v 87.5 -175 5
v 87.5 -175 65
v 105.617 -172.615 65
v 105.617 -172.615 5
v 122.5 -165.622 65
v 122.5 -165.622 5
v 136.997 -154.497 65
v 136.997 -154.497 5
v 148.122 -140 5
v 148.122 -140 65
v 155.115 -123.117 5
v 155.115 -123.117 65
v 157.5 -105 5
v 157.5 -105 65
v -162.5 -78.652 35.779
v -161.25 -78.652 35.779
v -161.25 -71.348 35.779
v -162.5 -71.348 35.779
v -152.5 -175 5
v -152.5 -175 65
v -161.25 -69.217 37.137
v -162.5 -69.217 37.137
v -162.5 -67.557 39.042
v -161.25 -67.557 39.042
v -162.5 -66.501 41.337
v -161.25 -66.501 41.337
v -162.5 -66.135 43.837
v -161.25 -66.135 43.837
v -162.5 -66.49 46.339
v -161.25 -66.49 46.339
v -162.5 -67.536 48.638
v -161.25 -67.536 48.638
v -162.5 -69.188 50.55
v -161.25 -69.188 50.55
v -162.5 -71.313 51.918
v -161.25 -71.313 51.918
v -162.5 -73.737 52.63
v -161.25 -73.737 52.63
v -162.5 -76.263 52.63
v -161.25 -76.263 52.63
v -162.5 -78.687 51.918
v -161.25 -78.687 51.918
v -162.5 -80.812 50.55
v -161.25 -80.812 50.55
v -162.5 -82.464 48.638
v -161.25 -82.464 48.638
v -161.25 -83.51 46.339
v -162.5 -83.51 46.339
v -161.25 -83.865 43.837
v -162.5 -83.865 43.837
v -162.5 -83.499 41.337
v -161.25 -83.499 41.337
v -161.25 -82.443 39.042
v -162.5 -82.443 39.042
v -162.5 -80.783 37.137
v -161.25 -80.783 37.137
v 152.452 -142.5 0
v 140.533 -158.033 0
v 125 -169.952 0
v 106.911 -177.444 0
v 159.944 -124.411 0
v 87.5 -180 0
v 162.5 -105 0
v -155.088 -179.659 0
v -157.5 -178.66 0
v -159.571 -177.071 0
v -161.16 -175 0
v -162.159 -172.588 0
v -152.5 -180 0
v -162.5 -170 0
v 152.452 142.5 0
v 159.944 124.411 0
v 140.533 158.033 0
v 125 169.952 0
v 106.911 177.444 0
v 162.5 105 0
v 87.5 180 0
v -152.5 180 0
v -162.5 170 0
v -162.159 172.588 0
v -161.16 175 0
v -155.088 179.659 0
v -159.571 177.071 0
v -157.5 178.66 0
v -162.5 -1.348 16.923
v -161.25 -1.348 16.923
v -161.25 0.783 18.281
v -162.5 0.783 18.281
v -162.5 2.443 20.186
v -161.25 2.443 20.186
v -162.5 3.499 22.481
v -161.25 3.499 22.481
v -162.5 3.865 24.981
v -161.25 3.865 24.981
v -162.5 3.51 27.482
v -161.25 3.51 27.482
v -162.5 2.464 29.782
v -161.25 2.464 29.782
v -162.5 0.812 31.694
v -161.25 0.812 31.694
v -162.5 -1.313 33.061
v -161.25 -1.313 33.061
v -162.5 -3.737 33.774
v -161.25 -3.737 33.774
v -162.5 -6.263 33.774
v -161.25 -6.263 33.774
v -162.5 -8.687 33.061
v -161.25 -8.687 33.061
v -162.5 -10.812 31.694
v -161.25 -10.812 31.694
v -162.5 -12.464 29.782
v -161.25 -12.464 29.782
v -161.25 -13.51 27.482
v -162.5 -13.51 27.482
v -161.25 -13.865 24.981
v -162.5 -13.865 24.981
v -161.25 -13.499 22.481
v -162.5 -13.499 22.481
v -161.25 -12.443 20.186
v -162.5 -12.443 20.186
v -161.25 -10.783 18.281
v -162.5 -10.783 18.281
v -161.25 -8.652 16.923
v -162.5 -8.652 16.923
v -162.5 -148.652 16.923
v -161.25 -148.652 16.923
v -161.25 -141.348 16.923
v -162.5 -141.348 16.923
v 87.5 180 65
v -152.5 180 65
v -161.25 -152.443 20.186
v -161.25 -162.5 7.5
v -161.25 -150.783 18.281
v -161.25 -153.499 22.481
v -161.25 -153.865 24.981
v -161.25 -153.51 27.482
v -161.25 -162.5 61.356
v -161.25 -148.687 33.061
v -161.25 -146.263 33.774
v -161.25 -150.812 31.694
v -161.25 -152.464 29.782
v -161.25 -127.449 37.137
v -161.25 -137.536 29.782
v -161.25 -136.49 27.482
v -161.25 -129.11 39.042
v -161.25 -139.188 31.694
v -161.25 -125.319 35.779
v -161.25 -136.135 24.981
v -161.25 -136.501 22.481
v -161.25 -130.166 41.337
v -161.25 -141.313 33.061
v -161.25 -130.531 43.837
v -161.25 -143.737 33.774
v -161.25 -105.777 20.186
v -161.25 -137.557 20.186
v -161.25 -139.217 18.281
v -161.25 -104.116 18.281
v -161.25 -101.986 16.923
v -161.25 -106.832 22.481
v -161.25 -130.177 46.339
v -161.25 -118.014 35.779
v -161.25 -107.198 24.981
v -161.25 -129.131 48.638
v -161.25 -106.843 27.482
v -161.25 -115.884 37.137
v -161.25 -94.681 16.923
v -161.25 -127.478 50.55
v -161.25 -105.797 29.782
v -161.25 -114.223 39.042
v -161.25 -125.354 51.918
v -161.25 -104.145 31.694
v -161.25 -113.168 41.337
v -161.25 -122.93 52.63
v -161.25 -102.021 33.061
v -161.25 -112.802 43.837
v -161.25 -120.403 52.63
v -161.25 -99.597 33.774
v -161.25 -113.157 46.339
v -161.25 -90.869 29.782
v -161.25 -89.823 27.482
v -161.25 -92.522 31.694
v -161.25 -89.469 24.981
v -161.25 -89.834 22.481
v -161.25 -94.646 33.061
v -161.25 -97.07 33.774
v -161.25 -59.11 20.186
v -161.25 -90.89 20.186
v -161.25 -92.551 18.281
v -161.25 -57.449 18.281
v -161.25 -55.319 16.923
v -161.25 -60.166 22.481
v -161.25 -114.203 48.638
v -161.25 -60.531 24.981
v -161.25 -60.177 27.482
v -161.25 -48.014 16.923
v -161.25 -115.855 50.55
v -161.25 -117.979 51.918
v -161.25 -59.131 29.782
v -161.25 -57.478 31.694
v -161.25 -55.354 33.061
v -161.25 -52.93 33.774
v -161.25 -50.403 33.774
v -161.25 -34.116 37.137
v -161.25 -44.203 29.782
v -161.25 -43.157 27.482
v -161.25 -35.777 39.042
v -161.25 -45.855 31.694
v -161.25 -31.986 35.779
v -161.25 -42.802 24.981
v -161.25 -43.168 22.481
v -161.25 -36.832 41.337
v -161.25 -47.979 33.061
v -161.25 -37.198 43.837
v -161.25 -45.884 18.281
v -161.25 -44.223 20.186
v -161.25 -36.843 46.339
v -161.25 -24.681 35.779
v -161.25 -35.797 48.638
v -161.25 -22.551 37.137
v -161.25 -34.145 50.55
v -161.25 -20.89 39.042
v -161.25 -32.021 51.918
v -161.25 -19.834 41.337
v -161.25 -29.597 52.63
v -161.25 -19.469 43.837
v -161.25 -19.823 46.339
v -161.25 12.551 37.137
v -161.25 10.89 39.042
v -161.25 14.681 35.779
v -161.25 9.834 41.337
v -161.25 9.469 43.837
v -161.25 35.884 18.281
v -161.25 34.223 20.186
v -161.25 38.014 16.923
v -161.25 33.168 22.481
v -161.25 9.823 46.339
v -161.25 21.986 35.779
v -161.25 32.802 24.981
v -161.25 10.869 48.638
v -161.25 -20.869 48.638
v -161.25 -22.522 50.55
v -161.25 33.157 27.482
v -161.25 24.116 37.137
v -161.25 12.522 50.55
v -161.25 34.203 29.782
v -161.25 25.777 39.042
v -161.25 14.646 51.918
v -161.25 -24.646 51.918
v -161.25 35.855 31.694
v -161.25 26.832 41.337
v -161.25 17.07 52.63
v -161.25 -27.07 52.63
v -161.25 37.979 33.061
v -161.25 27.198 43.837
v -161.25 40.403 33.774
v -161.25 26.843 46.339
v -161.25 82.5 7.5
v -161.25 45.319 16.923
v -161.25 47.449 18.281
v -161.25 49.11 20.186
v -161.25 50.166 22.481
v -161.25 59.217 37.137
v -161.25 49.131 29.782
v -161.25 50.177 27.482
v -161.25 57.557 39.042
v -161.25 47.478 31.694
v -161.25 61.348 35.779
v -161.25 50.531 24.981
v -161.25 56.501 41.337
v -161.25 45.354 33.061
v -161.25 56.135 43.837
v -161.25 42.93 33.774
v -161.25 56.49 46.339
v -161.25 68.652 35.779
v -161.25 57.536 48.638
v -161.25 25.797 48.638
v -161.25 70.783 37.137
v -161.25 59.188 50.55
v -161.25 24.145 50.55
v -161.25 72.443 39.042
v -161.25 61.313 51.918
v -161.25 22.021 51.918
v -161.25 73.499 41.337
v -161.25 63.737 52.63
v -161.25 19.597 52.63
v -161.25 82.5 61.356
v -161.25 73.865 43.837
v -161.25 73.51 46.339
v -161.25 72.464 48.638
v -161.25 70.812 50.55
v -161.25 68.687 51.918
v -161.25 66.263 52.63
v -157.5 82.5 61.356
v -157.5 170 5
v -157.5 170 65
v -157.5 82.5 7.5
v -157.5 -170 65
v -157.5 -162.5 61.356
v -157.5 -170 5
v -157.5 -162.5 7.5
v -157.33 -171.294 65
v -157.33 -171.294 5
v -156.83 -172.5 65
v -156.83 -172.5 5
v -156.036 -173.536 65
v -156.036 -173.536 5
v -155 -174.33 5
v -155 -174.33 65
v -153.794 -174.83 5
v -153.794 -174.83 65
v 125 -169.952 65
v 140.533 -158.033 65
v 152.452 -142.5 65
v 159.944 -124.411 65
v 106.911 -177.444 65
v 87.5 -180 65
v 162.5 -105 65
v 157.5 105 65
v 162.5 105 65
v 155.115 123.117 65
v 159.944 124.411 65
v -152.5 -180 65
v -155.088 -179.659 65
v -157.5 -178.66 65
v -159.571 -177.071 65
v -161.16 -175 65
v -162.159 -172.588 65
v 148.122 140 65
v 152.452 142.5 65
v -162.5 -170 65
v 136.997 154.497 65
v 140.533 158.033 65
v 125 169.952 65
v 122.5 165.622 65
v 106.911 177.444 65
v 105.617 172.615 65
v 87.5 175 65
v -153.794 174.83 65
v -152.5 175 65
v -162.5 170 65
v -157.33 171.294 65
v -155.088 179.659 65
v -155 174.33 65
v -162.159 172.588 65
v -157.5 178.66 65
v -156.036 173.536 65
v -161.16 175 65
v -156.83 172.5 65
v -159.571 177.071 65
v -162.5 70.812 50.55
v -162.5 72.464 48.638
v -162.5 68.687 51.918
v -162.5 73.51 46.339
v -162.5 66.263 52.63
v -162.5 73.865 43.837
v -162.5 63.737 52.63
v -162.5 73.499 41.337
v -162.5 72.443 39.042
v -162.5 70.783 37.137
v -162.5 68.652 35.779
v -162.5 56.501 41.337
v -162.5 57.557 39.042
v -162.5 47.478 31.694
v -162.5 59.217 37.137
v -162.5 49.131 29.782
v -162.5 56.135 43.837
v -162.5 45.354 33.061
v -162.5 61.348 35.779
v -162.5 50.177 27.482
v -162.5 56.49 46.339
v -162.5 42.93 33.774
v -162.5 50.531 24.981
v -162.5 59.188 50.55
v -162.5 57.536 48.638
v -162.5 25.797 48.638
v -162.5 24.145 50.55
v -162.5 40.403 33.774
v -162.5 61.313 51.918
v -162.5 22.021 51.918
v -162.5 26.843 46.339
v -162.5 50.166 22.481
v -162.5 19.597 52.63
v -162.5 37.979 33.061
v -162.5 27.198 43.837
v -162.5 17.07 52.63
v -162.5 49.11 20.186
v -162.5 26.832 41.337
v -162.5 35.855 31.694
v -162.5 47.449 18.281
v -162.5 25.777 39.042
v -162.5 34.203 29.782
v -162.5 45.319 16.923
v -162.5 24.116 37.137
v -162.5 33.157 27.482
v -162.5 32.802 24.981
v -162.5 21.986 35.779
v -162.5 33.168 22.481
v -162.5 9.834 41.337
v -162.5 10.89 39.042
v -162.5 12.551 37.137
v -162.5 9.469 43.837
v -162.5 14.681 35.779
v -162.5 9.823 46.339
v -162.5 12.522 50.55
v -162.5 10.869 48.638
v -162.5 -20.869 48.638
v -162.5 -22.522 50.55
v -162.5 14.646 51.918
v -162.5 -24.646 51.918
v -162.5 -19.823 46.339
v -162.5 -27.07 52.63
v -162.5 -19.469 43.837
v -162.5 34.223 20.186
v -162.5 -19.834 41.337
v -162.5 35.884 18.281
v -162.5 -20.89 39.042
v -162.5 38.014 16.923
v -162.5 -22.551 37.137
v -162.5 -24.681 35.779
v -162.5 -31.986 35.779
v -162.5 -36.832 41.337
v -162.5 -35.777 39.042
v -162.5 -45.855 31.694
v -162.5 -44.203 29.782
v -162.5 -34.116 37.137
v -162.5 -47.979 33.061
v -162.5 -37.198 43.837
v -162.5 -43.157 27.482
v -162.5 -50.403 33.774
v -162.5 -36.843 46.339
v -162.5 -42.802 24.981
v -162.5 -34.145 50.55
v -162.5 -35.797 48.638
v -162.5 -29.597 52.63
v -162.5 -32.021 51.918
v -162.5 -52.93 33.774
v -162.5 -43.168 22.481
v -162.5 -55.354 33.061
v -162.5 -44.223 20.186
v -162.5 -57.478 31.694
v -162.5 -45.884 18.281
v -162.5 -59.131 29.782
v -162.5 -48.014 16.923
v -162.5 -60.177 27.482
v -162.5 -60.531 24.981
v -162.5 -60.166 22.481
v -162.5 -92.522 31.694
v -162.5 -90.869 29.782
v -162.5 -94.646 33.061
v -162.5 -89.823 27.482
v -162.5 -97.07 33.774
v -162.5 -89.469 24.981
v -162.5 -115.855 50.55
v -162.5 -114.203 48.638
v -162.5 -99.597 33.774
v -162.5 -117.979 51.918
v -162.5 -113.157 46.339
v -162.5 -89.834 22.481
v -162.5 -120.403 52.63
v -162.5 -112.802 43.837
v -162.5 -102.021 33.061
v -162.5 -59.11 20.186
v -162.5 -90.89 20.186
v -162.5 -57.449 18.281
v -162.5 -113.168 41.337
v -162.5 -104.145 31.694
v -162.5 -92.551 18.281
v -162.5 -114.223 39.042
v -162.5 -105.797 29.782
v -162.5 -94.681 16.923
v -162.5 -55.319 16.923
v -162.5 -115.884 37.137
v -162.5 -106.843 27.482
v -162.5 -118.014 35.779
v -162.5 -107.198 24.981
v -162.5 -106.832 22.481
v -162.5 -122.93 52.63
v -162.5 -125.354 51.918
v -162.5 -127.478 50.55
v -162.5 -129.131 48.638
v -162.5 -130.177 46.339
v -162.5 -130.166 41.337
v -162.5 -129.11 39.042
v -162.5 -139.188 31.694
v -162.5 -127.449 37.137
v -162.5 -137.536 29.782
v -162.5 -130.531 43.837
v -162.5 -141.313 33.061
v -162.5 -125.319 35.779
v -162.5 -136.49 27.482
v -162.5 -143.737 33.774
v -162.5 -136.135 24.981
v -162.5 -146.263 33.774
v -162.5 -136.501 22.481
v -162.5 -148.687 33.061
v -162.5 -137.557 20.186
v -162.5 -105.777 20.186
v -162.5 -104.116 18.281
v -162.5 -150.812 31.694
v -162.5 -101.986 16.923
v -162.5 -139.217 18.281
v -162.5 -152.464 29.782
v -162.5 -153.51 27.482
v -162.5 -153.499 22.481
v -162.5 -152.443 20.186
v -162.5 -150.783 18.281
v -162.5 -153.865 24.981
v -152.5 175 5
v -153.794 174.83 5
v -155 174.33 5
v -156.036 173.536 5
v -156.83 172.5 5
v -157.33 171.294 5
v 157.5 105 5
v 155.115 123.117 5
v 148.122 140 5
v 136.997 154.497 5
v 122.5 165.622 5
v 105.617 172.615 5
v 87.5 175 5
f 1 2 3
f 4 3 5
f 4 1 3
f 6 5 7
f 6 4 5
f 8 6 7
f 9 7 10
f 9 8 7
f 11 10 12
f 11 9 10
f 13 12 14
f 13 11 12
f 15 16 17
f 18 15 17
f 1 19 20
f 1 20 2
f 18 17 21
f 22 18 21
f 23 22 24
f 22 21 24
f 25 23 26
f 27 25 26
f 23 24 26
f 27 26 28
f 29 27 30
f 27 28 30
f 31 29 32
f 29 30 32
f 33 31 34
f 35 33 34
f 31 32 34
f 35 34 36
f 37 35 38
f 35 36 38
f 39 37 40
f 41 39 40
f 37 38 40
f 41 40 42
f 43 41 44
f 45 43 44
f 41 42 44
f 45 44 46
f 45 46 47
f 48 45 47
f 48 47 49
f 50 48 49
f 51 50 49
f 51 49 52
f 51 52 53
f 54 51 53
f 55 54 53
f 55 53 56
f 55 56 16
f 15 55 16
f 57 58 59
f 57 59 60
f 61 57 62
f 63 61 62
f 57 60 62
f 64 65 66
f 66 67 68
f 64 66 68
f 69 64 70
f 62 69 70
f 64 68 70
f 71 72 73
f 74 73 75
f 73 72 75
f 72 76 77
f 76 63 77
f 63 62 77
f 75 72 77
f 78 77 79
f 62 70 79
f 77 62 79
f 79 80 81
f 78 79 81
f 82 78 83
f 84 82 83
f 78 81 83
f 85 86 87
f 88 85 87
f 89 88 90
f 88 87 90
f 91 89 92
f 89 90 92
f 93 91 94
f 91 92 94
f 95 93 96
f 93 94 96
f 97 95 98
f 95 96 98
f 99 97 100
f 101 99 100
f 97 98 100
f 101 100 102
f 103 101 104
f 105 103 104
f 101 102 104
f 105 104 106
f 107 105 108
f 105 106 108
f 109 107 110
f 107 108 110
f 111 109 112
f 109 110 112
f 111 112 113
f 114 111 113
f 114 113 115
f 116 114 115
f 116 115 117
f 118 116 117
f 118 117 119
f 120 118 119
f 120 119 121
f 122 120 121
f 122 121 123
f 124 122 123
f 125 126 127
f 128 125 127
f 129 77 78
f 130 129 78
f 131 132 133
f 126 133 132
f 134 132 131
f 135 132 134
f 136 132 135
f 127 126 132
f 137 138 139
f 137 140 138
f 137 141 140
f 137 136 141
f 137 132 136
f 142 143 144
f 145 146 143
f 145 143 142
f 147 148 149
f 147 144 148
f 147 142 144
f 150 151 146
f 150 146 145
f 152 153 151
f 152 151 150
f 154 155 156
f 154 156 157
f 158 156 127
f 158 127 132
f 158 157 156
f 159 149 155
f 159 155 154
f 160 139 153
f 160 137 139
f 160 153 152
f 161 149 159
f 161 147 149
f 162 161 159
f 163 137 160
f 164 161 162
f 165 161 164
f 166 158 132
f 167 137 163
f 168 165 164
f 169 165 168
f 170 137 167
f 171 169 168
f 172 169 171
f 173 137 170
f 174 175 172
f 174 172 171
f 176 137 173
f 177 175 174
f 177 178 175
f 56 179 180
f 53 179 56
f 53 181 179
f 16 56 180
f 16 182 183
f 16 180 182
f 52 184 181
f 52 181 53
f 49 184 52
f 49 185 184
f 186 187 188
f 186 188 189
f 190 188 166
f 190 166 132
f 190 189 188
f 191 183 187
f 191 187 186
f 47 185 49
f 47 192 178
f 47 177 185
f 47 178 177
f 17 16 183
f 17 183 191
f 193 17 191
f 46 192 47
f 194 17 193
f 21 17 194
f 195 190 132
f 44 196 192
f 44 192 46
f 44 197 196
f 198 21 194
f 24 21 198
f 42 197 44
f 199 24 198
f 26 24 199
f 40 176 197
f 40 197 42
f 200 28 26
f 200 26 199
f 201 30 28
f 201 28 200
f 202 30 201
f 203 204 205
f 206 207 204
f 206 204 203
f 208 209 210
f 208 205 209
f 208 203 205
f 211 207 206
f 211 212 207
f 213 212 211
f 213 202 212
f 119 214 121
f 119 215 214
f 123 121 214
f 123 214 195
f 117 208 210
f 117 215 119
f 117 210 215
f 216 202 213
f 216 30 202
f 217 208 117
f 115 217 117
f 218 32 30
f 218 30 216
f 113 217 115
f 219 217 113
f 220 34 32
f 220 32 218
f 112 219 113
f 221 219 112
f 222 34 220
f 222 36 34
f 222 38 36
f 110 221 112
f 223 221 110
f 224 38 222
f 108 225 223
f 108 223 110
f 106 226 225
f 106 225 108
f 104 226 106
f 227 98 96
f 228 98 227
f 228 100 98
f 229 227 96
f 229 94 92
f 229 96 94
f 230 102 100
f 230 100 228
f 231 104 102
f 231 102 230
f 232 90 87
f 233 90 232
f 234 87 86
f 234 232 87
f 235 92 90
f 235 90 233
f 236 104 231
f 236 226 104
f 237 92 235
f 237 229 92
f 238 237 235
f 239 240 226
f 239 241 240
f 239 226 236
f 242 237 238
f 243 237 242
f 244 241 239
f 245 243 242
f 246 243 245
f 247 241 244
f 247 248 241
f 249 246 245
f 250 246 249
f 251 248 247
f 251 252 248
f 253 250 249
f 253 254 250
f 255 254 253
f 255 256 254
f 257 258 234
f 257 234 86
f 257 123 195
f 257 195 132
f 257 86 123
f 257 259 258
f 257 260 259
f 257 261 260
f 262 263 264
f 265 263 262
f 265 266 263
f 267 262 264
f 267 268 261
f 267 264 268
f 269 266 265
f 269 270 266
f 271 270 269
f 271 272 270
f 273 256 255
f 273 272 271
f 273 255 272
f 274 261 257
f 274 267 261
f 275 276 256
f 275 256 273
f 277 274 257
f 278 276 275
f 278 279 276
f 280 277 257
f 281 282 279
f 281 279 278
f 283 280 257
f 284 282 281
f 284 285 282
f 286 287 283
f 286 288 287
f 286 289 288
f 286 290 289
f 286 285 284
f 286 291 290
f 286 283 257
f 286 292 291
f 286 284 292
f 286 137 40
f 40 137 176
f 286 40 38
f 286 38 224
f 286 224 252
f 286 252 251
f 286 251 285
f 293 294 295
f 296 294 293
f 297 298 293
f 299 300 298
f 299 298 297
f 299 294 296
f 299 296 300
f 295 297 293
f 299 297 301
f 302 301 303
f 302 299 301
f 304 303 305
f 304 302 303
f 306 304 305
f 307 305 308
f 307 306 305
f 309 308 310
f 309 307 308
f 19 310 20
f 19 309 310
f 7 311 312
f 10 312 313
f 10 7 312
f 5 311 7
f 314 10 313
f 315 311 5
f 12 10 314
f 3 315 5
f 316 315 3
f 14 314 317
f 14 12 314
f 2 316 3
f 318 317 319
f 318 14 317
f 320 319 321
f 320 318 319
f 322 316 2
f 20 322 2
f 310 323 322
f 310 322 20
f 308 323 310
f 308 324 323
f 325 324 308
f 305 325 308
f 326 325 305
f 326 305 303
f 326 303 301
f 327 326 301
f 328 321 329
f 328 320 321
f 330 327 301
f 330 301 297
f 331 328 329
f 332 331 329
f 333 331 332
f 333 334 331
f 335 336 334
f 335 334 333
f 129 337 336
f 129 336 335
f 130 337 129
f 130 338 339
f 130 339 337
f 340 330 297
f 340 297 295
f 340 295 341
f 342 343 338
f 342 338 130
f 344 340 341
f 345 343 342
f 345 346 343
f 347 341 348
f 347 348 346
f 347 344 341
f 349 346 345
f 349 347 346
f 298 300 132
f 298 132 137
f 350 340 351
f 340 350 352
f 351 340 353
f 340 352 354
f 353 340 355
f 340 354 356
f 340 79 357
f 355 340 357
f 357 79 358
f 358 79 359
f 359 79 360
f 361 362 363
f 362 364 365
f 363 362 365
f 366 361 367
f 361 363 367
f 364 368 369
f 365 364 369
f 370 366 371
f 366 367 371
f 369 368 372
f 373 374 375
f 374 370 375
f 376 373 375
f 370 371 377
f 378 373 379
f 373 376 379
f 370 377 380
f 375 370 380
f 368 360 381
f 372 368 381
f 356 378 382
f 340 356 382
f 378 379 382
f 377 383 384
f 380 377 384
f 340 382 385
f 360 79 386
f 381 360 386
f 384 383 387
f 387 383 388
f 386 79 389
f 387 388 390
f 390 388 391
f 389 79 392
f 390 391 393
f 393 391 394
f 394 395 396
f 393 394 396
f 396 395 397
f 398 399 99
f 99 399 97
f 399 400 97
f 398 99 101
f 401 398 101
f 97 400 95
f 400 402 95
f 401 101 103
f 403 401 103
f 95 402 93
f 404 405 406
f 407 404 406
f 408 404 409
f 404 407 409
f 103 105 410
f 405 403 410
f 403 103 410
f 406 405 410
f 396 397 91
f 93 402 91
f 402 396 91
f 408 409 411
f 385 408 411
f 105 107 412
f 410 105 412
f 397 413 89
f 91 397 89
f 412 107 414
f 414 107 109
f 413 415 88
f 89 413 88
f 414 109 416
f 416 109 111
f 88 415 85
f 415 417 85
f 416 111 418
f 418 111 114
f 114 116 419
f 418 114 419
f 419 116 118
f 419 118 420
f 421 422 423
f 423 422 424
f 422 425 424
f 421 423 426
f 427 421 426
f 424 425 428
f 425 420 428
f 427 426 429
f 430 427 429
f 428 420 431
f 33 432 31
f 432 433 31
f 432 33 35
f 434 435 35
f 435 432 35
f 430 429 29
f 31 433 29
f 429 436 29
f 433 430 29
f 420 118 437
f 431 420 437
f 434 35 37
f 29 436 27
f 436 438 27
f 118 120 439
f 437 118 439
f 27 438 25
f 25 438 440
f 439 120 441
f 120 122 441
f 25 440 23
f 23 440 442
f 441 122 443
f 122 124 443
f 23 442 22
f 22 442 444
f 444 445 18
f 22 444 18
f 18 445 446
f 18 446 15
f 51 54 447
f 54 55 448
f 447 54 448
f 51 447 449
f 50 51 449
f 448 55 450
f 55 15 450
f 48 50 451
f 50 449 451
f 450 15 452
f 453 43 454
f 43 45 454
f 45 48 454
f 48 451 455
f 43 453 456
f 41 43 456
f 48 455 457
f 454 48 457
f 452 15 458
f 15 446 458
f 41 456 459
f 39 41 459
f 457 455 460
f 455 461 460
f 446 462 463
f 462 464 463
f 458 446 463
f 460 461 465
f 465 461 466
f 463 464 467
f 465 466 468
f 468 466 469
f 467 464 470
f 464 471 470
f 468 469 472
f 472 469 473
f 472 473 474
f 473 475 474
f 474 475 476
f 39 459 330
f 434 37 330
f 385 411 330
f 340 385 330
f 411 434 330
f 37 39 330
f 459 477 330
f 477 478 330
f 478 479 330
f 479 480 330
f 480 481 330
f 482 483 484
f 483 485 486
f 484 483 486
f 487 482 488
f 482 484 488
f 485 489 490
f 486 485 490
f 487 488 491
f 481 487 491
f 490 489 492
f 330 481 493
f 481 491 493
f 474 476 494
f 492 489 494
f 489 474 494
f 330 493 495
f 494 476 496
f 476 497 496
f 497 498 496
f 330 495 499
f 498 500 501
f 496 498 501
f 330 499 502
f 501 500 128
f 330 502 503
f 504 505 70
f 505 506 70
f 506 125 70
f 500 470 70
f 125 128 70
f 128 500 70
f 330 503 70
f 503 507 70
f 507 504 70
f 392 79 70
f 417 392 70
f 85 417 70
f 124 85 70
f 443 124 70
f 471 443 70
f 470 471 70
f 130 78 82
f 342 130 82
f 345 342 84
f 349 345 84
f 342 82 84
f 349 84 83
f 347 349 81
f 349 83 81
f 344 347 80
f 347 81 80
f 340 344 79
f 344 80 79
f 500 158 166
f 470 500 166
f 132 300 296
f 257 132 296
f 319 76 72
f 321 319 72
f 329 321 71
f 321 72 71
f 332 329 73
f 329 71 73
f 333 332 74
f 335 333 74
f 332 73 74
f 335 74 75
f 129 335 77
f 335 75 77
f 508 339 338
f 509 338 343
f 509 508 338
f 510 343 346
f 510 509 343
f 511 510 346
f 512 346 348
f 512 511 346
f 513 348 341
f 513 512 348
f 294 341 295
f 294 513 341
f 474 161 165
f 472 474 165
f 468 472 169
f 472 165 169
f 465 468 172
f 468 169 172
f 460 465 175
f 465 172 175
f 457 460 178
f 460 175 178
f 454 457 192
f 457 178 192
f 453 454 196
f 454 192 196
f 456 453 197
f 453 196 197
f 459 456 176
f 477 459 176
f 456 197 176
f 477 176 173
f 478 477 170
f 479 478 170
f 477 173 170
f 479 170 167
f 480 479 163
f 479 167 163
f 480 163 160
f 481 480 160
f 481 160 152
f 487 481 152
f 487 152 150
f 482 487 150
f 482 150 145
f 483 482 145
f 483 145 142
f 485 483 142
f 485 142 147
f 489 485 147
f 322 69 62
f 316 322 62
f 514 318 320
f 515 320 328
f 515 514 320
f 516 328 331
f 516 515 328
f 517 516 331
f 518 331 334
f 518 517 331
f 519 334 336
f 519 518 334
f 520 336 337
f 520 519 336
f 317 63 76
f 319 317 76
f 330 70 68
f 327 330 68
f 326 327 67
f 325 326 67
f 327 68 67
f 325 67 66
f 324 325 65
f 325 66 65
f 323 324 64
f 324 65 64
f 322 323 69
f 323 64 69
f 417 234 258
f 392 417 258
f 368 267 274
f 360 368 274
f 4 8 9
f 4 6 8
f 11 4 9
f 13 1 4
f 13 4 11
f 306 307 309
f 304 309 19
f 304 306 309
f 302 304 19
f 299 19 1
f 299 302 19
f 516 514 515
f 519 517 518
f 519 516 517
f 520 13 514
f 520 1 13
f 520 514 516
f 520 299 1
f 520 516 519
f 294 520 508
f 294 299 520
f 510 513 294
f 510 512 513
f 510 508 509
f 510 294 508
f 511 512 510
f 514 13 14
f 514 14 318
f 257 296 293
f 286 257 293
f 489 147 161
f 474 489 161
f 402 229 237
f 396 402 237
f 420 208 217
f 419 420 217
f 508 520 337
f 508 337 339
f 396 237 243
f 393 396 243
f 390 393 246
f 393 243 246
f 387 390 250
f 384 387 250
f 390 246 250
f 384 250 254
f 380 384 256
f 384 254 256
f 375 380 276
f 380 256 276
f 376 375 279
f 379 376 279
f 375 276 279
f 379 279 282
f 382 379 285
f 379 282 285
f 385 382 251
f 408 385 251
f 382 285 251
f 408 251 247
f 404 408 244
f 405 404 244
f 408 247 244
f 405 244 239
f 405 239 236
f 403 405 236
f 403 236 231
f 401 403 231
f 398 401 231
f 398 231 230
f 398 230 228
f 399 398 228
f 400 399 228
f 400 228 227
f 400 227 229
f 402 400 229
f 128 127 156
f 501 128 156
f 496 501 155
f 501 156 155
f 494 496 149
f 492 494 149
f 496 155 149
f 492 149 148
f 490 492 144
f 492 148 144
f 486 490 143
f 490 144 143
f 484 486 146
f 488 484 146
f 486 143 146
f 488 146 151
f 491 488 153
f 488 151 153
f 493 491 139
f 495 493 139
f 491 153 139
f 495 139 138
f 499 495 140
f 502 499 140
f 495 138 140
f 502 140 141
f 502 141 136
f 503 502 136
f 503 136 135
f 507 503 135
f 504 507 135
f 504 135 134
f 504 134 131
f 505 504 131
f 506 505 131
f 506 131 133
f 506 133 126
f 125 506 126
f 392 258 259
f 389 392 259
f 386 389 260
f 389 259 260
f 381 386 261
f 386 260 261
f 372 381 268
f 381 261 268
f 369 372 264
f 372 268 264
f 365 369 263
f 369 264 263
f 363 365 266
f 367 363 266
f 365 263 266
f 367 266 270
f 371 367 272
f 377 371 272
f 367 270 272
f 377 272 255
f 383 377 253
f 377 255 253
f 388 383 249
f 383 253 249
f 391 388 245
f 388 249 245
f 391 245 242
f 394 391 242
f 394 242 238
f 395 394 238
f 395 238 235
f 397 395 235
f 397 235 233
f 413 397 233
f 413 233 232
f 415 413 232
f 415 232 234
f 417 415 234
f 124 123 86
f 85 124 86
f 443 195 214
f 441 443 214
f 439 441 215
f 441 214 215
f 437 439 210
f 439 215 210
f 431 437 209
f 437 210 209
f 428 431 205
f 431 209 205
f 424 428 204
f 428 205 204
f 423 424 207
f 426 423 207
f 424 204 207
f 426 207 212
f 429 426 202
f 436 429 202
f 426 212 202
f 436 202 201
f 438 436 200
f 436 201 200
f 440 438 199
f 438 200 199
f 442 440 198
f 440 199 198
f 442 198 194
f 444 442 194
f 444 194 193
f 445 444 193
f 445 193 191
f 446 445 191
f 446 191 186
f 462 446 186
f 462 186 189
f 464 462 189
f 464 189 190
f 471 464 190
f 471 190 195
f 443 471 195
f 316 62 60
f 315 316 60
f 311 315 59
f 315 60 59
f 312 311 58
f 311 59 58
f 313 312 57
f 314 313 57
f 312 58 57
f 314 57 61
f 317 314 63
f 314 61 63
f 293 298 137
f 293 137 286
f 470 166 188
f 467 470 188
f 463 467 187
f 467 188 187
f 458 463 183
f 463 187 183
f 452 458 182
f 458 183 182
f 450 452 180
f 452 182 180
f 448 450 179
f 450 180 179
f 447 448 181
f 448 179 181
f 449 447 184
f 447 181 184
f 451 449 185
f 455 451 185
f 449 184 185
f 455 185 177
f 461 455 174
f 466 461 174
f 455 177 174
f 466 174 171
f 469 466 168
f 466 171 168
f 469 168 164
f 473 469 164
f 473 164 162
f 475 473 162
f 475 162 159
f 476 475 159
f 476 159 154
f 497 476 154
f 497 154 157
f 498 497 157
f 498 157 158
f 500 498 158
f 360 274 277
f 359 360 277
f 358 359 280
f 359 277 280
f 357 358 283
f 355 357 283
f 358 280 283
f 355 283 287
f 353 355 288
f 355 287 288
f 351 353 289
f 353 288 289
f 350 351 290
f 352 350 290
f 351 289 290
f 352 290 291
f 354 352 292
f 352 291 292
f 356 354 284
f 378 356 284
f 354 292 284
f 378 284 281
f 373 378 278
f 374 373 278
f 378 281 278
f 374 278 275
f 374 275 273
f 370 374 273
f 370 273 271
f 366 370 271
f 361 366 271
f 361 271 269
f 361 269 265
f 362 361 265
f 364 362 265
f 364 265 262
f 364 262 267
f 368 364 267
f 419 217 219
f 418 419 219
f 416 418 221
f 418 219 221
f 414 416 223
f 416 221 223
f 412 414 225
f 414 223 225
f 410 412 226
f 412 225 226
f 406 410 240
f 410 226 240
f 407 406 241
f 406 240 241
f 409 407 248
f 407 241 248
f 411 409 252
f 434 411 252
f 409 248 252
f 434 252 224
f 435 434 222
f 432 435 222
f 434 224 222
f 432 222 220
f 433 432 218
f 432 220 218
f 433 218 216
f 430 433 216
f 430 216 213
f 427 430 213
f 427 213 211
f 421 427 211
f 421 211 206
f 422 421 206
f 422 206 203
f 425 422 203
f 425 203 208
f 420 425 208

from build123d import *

# Parameters (mm, degrees)
BOSS_EXTRUDE1_DEPTH = 65
SHELL1_T            = -5
CUT_EXTRUDE1_DEPTH  = 373.86056375
SKETCH4_W           = 245
SKETCH4_H           = 53.856180832
CUT_EXTRUDE2_DEPTH  = 3.75


# Read off the part's stored shape, not the designer's step: Boss-Extrude1
with BuildPart() as part:
    # Boss-Extrude1 outline → Boss-Extrude1 (new body)
    with BuildSketch(Plane(origin=(0, 0, 0), x_dir=(0, 1, 0), z_dir=(0, 0, 1))):
        with BuildLine():
            ThreePointArc((105, -162.5), (158.033008589, -140.533008589), (180, -87.5))
            Line((180, -87.5), (180, 152.5))
            ThreePointArc((180, 152.5), (177.071067812, 159.571067812), (170, 162.5))
            Line((170, 162.5), (-170, 162.5))
            ThreePointArc((-170, 162.5), (-177.071067812, 159.571067812), (-180, 152.5))
            Line((-180, 152.5), (-180, -87.5))
            ThreePointArc((-180, -87.5), (-158.033008589, -140.533008589), (-105, -162.5))
            Line((-105, -162.5), (105, -162.5))
        make_face()
    extrude(amount=BOSS_EXTRUDE1_DEPTH)

    # Shell1
    shell1_openings = [part.faces().sort_by_distance(p)[0] for p in [
        (-3.011930619, 0, 65),
    ]]
    offset(amount=SHELL1_T, openings=shell1_openings, kind=Kind.INTERSECTION)

    # Sketch3 → Cut-Extrude1 (cut, through all)
    with BuildSketch(Plane.YZ.offset(-157.5)):
        with BuildLine():
            Line((-148.652392821, 16.9228), (-141.347607179, 16.9228))
            ThreePointArc((-141.347607179, 16.9228), (-145, 33.8646), (-148.652392821, 16.9228))
        make_face()
        with BuildLine():
            Line((-125.319059488, 35.778980832), (-118.014273846, 35.778980832))
            ThreePointArc((-118.014273846, 35.778980832), (-121.666666667, 52.720780832), (-125.319059488, 35.778980832))
        make_face()
        with BuildLine():
            Line((-78.652392821, 35.778980832), (-71.347607179, 35.778980832))
            ThreePointArc((-71.347607179, 35.778980832), (-75, 52.720780832), (-78.652392821, 35.778980832))
        make_face()
        with BuildLine():
            Line((-101.985726154, 16.9228), (-94.680940512, 16.9228))
            ThreePointArc((-94.680940512, 16.9228), (-98.333333333, 33.8646), (-101.985726154, 16.9228))
        make_face()
        with BuildLine():
            Line((-31.985726154, 35.778980832), (-24.680940512, 35.778980832))
            ThreePointArc((-24.680940512, 35.778980832), (-28.333333333, 52.720780832), (-31.985726154, 35.778980832))
        make_face()
        with BuildLine():
            Line((-55.319059488, 16.9228), (-48.014273846, 16.9228))
            ThreePointArc((-48.014273846, 16.9228), (-51.666666667, 33.8646), (-55.319059488, 16.9228))
        make_face()
        with BuildLine():
            Line((14.680940512, 35.778980832), (21.985726154, 35.778980832))
            ThreePointArc((21.985726154, 35.778980832), (18.333333333, 52.720780832), (14.680940512, 35.778980832))
        make_face()
        with BuildLine():
            Line((-8.652392821, 16.9228), (-1.347607179, 16.9228))
            ThreePointArc((-1.347607179, 16.9228), (-5, 33.8646), (-8.652392821, 16.9228))
        make_face()
        with BuildLine():
            Line((61.347607179, 35.778980832), (68.652392821, 35.778980832))
            ThreePointArc((68.652392821, 35.778980832), (65, 52.720780832), (61.347607179, 35.778980832))
        make_face()
        with BuildLine():
            Line((38.014273846, 16.9228), (45.319059488, 16.9228))
            ThreePointArc((45.319059488, 16.9228), (41.666666667, 33.8646), (38.014273846, 16.9228))
        make_face()
    extrude(amount=-CUT_EXTRUDE1_DEPTH, mode=Mode.SUBTRACT)

    # Sketch4 → Cut-Extrude2 (cut)
    with BuildSketch(Plane.YZ.offset(-157.5)):
        with Locations((-40, 34.428090416)):
            Rectangle(SKETCH4_W, SKETCH4_H)
    extrude(amount=-CUT_EXTRUDE2_DEPTH, mode=Mode.SUBTRACT)


solid = part.part
